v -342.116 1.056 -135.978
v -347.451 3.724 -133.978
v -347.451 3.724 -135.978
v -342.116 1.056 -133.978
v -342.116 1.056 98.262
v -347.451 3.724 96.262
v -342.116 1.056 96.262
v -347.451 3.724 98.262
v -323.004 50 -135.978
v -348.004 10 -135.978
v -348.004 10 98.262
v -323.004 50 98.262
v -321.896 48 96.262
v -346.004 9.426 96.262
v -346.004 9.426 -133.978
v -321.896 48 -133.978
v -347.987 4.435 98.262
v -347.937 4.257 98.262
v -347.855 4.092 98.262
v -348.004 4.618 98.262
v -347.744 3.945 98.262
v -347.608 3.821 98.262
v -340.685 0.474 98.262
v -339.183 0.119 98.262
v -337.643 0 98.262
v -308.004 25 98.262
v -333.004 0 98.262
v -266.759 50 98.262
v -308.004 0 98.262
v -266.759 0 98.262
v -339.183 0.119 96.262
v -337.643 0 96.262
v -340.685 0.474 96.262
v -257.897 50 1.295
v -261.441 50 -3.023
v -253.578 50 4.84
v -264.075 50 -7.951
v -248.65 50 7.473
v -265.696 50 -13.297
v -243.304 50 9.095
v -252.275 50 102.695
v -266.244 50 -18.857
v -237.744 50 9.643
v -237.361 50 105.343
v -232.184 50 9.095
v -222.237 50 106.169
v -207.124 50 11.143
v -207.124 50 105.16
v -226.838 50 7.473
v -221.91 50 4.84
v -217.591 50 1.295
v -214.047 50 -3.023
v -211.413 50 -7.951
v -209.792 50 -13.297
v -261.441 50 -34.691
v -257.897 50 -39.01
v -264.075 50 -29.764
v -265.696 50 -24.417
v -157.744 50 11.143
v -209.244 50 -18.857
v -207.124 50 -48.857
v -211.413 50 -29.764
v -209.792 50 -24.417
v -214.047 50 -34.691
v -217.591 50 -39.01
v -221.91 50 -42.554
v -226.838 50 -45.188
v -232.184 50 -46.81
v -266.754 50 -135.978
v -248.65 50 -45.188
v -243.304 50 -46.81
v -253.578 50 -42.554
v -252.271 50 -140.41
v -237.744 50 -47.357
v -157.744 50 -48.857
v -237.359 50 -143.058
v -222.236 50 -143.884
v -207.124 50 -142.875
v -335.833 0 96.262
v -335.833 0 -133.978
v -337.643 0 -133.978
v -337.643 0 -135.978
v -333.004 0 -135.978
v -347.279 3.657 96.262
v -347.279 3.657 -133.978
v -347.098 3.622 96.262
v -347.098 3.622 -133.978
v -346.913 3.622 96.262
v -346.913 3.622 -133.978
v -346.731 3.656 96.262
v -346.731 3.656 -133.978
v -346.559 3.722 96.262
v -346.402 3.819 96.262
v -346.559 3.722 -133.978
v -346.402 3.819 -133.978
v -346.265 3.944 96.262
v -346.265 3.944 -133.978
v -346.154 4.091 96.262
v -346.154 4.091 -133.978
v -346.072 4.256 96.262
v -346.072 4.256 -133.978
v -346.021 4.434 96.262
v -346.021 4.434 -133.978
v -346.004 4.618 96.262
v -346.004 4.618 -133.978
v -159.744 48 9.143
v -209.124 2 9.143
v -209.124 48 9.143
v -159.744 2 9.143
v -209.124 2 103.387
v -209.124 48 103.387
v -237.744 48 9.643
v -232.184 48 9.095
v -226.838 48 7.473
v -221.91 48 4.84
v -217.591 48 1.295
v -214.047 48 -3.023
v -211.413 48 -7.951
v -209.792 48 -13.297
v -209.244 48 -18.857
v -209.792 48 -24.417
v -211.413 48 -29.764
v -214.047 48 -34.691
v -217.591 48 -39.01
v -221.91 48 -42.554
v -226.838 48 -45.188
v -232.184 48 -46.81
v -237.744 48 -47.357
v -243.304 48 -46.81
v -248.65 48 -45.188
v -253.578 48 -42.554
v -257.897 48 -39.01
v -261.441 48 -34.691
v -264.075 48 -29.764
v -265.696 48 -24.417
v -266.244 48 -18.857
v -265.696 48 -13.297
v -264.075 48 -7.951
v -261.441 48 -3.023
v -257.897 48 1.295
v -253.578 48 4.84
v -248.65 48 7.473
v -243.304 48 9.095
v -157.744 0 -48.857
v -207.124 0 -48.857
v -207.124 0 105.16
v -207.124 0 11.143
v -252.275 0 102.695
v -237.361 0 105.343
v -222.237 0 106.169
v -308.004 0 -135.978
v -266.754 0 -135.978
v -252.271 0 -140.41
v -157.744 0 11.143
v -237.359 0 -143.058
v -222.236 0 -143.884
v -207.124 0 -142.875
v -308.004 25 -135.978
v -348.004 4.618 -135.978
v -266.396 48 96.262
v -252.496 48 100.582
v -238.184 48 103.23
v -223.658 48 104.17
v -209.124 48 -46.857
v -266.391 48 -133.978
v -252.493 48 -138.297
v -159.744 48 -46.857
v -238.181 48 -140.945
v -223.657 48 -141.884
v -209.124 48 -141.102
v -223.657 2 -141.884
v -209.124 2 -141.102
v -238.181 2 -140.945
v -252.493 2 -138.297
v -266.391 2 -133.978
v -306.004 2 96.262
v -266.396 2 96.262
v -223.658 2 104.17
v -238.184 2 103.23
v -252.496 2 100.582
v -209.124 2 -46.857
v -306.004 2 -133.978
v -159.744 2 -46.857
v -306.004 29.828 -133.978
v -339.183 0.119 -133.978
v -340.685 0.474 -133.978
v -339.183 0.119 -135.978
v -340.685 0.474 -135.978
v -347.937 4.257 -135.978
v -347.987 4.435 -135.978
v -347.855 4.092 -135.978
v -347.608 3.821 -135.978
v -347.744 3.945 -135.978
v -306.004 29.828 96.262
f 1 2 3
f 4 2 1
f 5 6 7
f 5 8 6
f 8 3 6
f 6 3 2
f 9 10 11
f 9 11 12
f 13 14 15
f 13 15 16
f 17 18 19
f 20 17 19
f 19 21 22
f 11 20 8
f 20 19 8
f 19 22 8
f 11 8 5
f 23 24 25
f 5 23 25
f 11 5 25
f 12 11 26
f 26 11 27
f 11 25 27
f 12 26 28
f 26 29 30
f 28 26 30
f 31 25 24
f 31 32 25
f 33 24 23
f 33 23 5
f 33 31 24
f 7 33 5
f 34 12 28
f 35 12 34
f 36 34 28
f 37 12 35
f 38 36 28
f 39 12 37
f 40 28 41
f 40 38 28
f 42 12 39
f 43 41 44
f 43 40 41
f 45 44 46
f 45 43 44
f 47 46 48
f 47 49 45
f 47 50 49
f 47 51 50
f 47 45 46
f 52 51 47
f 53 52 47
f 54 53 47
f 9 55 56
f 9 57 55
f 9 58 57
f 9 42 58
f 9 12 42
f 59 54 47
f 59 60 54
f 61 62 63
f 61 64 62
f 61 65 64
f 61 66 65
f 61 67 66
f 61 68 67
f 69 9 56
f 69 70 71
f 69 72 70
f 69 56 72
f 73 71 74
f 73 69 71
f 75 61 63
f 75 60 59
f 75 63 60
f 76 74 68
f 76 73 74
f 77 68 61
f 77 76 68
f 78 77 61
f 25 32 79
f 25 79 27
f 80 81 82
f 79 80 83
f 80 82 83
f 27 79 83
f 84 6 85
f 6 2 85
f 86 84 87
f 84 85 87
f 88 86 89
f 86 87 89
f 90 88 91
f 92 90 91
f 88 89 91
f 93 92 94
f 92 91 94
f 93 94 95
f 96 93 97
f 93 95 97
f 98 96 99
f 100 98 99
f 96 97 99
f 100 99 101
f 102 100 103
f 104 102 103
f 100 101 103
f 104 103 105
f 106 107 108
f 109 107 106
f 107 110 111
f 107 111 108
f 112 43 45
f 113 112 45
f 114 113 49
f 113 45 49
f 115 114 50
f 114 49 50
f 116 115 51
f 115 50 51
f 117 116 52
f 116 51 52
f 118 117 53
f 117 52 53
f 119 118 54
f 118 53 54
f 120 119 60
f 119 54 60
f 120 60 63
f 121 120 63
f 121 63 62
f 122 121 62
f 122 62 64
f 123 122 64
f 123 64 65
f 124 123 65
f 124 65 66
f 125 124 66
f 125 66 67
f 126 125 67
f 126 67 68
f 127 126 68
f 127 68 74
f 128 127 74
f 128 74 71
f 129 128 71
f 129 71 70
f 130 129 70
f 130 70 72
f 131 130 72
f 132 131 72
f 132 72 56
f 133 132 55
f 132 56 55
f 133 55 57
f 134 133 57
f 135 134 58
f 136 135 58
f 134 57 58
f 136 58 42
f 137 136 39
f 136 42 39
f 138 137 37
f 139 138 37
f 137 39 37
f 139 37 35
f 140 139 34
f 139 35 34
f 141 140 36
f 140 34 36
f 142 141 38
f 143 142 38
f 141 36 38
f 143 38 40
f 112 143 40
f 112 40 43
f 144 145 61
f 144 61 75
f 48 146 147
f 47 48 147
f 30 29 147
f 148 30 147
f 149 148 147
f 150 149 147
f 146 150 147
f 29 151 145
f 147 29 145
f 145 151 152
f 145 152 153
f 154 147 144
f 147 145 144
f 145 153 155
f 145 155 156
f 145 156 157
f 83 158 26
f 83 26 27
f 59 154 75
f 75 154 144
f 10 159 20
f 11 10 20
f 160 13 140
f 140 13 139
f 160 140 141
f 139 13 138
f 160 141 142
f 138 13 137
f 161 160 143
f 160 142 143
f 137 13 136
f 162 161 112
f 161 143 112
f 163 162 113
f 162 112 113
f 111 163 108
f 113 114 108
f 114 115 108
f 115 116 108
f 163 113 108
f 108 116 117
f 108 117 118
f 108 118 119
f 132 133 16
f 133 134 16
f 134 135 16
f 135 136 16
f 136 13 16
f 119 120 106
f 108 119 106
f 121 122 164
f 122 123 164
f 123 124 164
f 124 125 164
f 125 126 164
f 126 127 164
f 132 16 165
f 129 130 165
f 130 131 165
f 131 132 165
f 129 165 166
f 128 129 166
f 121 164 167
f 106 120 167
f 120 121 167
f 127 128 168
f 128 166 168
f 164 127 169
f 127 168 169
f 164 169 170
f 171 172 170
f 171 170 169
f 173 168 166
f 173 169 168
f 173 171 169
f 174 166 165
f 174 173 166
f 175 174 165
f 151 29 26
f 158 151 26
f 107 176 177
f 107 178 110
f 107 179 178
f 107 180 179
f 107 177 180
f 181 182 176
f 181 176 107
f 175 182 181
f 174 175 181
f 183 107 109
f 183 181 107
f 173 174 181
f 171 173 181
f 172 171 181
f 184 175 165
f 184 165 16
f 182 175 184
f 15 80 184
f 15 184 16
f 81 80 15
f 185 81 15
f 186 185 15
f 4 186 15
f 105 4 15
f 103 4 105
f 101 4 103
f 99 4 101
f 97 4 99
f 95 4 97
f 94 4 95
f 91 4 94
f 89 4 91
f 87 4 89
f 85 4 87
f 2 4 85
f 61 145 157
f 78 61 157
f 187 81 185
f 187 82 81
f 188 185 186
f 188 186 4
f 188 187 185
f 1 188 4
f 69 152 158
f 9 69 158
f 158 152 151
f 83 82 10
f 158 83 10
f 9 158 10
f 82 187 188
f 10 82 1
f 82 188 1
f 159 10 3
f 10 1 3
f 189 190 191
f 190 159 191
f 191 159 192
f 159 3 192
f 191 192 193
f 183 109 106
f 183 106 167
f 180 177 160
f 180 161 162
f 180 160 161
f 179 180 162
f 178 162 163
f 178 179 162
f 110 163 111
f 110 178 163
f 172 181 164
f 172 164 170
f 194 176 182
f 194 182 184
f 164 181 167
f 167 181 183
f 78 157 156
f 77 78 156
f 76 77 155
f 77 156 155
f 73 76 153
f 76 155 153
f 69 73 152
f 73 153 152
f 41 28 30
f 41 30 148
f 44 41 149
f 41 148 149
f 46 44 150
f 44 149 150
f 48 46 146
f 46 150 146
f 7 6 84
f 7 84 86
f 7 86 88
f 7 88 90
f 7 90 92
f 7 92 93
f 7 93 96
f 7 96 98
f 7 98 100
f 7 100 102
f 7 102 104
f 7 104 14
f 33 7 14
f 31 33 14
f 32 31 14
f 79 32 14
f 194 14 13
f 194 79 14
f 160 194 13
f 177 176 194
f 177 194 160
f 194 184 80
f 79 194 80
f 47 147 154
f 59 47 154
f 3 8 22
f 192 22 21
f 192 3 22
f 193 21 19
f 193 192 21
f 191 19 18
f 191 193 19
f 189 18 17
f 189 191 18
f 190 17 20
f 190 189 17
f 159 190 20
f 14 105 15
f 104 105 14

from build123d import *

# Parameters (mm, degrees)
SKETCH1_W           = 109
SKETCH1_H           = 60
BOSS_EXTRUDE1_DEPTH = 50
CUT_EXTRUDE1_DEPTH  = 500
SHELL2_T            = -2
CUT_EXTRUDE2_DEPTH  = 500
FILLET1_R           = 1
FILLET2_R           = 10
SKETCH4_R           = 28.5
CUT_EXTRUDE3_DEPTH  = 5


with BuildPart() as part:
    # Sketch1 → Boss-Extrude1 (new body)
    with BuildSketch(Plane(origin=(0, 0, 0), x_dir=(1, 0, 0), z_dir=(0, 1, 0))):
        with BuildLine():
            ThreePointArc((-348.004117683, 21.026446367), (-325.093541396, 91.023149879), (-266.754117683, 135.978067844))
            Line((-266.754117683, 135.978067844), (-348.004117683, 135.978067844))
            Line((-348.004117683, 135.978067844), (-348.004117683, 21.026446367))
        make_face()
        with BuildLine():
            Line((-266.754117683, -98.261932156), (-266.754117683, 135.978067844))
            ThreePointArc((-266.754117683, 135.978067844), (-325.093541396, 91.023149879), (-348.004117683, 21.026446367))
            Line((-348.004117683, 21.026446367), (-348.004117683, 16.688022305))
            ThreePointArc((-348.004117683, 16.688022305), (-325.094915866, -53.306736582), (-266.758579073, -98.261932156))
            Line((-266.758579073, -98.261932156), (-266.754117683, -98.261932156))
        make_face()
        with BuildLine():
            Line((-348.004117683, -98.261932156), (-266.758579073, -98.261932156))
            ThreePointArc((-266.758579073, -98.261932156), (-325.094915866, -53.306736582), (-348.004117683, 16.688022305))
            Line((-348.004117683, 16.688022305), (-348.004117683, -98.261932156))
        make_face()
        with BuildLine():
            Line((-266.743984385, 48.857234336), (-207.123984385, 48.857234336))
            Line((-207.123984385, 48.857234336), (-207.123984385, 142.874902464))
            ThreePointArc((-207.123984385, 142.874902464), (-237.359097186, 143.058210347), (-266.754117683, 135.978067844))
            Line((-266.754117683, 135.978067844), (-266.754117683, -98.261932156))
            Line((-266.754117683, -98.261932156), (-266.758579073, -98.261932156))
            ThreePointArc((-266.758579073, -98.261932156), (-237.361462745, -105.343468051), (-207.123984385, -105.160433792))
            Line((-207.123984385, -105.160433792), (-207.123984385, -11.142765664))
            Line((-207.123984385, -11.142765664), (-266.743984385, -11.142765664))
            Line((-266.743984385, -11.142765664), (-266.743984385, 48.857234336))
        make_face()
        with Locations((-212.243984385, 18.857234336)):
            Rectangle(SKETCH1_W, SKETCH1_H)
    extrude(amount=BOSS_EXTRUDE1_DEPTH)

    # Sketch2 → Cut-Extrude1 (cut)
    with BuildSketch(Plane.XY.offset(98.261932156)):
        Polygon((-348.004117683, 50), (-348.004117683, 10), (-323.004117683, 50), align=None)
        Polygon((-308.004117683, 25), (-333.004117683, 0), (-308.004117683, 0), align=None)
    extrude(amount=-CUT_EXTRUDE1_DEPTH, mode=Mode.SUBTRACT)

    # Shell2
    shell2_openings = [part.faces().sort_by_distance(p)[0] for p in [
        (-340.504117683, 0, -18.858067844),
    ]]
    offset(amount=SHELL2_T, openings=shell2_openings, kind=Kind.INTERSECTION)

    # Sketch3 → Cut-Extrude2 (cut)
    with BuildSketch(Plane.XY.offset(98.261932156)):
        Polygon((-348.004117683, 0), (-348.004117683, 4), (-340.004117683, 0), align=None)
    extrude(amount=-CUT_EXTRUDE2_DEPTH, mode=Mode.SUBTRACT)

    # Fillet1
    fillet1_edges = [part.edges().sort_by_distance(p)[0] for p in [
        (-348.004117683, 4, -18.858067844),
        (-346.004117683, 3, -18.858067844),
    ]]
    fillet(fillet1_edges, radius=FILLET1_R - 0.0001)  # a hair under: the kernel refuses the full size

    # Fillet2
    fillet2_edges = [part.edges().sort_by_distance(p)[0] for p in [
        (-340.004117683, 0, -134.978067844),
        (-340.004117683, 0, 97.261932156),
    ]]
    fillet(fillet2_edges, radius=FILLET2_R)

    # Sketch4 → Cut-Extrude3 (cut)
    with BuildSketch(Plane(origin=(0, 50, 0), x_dir=(1, 0, 0), z_dir=(0, 1, 0))):
        with Locations(Location((-237.743984385, 18.857234336, 0), (0, 0, 270))):
            Circle(SKETCH4_R)
    extrude(amount=-CUT_EXTRUDE3_DEPTH, mode=Mode.SUBTRACT)


solid = part.part
